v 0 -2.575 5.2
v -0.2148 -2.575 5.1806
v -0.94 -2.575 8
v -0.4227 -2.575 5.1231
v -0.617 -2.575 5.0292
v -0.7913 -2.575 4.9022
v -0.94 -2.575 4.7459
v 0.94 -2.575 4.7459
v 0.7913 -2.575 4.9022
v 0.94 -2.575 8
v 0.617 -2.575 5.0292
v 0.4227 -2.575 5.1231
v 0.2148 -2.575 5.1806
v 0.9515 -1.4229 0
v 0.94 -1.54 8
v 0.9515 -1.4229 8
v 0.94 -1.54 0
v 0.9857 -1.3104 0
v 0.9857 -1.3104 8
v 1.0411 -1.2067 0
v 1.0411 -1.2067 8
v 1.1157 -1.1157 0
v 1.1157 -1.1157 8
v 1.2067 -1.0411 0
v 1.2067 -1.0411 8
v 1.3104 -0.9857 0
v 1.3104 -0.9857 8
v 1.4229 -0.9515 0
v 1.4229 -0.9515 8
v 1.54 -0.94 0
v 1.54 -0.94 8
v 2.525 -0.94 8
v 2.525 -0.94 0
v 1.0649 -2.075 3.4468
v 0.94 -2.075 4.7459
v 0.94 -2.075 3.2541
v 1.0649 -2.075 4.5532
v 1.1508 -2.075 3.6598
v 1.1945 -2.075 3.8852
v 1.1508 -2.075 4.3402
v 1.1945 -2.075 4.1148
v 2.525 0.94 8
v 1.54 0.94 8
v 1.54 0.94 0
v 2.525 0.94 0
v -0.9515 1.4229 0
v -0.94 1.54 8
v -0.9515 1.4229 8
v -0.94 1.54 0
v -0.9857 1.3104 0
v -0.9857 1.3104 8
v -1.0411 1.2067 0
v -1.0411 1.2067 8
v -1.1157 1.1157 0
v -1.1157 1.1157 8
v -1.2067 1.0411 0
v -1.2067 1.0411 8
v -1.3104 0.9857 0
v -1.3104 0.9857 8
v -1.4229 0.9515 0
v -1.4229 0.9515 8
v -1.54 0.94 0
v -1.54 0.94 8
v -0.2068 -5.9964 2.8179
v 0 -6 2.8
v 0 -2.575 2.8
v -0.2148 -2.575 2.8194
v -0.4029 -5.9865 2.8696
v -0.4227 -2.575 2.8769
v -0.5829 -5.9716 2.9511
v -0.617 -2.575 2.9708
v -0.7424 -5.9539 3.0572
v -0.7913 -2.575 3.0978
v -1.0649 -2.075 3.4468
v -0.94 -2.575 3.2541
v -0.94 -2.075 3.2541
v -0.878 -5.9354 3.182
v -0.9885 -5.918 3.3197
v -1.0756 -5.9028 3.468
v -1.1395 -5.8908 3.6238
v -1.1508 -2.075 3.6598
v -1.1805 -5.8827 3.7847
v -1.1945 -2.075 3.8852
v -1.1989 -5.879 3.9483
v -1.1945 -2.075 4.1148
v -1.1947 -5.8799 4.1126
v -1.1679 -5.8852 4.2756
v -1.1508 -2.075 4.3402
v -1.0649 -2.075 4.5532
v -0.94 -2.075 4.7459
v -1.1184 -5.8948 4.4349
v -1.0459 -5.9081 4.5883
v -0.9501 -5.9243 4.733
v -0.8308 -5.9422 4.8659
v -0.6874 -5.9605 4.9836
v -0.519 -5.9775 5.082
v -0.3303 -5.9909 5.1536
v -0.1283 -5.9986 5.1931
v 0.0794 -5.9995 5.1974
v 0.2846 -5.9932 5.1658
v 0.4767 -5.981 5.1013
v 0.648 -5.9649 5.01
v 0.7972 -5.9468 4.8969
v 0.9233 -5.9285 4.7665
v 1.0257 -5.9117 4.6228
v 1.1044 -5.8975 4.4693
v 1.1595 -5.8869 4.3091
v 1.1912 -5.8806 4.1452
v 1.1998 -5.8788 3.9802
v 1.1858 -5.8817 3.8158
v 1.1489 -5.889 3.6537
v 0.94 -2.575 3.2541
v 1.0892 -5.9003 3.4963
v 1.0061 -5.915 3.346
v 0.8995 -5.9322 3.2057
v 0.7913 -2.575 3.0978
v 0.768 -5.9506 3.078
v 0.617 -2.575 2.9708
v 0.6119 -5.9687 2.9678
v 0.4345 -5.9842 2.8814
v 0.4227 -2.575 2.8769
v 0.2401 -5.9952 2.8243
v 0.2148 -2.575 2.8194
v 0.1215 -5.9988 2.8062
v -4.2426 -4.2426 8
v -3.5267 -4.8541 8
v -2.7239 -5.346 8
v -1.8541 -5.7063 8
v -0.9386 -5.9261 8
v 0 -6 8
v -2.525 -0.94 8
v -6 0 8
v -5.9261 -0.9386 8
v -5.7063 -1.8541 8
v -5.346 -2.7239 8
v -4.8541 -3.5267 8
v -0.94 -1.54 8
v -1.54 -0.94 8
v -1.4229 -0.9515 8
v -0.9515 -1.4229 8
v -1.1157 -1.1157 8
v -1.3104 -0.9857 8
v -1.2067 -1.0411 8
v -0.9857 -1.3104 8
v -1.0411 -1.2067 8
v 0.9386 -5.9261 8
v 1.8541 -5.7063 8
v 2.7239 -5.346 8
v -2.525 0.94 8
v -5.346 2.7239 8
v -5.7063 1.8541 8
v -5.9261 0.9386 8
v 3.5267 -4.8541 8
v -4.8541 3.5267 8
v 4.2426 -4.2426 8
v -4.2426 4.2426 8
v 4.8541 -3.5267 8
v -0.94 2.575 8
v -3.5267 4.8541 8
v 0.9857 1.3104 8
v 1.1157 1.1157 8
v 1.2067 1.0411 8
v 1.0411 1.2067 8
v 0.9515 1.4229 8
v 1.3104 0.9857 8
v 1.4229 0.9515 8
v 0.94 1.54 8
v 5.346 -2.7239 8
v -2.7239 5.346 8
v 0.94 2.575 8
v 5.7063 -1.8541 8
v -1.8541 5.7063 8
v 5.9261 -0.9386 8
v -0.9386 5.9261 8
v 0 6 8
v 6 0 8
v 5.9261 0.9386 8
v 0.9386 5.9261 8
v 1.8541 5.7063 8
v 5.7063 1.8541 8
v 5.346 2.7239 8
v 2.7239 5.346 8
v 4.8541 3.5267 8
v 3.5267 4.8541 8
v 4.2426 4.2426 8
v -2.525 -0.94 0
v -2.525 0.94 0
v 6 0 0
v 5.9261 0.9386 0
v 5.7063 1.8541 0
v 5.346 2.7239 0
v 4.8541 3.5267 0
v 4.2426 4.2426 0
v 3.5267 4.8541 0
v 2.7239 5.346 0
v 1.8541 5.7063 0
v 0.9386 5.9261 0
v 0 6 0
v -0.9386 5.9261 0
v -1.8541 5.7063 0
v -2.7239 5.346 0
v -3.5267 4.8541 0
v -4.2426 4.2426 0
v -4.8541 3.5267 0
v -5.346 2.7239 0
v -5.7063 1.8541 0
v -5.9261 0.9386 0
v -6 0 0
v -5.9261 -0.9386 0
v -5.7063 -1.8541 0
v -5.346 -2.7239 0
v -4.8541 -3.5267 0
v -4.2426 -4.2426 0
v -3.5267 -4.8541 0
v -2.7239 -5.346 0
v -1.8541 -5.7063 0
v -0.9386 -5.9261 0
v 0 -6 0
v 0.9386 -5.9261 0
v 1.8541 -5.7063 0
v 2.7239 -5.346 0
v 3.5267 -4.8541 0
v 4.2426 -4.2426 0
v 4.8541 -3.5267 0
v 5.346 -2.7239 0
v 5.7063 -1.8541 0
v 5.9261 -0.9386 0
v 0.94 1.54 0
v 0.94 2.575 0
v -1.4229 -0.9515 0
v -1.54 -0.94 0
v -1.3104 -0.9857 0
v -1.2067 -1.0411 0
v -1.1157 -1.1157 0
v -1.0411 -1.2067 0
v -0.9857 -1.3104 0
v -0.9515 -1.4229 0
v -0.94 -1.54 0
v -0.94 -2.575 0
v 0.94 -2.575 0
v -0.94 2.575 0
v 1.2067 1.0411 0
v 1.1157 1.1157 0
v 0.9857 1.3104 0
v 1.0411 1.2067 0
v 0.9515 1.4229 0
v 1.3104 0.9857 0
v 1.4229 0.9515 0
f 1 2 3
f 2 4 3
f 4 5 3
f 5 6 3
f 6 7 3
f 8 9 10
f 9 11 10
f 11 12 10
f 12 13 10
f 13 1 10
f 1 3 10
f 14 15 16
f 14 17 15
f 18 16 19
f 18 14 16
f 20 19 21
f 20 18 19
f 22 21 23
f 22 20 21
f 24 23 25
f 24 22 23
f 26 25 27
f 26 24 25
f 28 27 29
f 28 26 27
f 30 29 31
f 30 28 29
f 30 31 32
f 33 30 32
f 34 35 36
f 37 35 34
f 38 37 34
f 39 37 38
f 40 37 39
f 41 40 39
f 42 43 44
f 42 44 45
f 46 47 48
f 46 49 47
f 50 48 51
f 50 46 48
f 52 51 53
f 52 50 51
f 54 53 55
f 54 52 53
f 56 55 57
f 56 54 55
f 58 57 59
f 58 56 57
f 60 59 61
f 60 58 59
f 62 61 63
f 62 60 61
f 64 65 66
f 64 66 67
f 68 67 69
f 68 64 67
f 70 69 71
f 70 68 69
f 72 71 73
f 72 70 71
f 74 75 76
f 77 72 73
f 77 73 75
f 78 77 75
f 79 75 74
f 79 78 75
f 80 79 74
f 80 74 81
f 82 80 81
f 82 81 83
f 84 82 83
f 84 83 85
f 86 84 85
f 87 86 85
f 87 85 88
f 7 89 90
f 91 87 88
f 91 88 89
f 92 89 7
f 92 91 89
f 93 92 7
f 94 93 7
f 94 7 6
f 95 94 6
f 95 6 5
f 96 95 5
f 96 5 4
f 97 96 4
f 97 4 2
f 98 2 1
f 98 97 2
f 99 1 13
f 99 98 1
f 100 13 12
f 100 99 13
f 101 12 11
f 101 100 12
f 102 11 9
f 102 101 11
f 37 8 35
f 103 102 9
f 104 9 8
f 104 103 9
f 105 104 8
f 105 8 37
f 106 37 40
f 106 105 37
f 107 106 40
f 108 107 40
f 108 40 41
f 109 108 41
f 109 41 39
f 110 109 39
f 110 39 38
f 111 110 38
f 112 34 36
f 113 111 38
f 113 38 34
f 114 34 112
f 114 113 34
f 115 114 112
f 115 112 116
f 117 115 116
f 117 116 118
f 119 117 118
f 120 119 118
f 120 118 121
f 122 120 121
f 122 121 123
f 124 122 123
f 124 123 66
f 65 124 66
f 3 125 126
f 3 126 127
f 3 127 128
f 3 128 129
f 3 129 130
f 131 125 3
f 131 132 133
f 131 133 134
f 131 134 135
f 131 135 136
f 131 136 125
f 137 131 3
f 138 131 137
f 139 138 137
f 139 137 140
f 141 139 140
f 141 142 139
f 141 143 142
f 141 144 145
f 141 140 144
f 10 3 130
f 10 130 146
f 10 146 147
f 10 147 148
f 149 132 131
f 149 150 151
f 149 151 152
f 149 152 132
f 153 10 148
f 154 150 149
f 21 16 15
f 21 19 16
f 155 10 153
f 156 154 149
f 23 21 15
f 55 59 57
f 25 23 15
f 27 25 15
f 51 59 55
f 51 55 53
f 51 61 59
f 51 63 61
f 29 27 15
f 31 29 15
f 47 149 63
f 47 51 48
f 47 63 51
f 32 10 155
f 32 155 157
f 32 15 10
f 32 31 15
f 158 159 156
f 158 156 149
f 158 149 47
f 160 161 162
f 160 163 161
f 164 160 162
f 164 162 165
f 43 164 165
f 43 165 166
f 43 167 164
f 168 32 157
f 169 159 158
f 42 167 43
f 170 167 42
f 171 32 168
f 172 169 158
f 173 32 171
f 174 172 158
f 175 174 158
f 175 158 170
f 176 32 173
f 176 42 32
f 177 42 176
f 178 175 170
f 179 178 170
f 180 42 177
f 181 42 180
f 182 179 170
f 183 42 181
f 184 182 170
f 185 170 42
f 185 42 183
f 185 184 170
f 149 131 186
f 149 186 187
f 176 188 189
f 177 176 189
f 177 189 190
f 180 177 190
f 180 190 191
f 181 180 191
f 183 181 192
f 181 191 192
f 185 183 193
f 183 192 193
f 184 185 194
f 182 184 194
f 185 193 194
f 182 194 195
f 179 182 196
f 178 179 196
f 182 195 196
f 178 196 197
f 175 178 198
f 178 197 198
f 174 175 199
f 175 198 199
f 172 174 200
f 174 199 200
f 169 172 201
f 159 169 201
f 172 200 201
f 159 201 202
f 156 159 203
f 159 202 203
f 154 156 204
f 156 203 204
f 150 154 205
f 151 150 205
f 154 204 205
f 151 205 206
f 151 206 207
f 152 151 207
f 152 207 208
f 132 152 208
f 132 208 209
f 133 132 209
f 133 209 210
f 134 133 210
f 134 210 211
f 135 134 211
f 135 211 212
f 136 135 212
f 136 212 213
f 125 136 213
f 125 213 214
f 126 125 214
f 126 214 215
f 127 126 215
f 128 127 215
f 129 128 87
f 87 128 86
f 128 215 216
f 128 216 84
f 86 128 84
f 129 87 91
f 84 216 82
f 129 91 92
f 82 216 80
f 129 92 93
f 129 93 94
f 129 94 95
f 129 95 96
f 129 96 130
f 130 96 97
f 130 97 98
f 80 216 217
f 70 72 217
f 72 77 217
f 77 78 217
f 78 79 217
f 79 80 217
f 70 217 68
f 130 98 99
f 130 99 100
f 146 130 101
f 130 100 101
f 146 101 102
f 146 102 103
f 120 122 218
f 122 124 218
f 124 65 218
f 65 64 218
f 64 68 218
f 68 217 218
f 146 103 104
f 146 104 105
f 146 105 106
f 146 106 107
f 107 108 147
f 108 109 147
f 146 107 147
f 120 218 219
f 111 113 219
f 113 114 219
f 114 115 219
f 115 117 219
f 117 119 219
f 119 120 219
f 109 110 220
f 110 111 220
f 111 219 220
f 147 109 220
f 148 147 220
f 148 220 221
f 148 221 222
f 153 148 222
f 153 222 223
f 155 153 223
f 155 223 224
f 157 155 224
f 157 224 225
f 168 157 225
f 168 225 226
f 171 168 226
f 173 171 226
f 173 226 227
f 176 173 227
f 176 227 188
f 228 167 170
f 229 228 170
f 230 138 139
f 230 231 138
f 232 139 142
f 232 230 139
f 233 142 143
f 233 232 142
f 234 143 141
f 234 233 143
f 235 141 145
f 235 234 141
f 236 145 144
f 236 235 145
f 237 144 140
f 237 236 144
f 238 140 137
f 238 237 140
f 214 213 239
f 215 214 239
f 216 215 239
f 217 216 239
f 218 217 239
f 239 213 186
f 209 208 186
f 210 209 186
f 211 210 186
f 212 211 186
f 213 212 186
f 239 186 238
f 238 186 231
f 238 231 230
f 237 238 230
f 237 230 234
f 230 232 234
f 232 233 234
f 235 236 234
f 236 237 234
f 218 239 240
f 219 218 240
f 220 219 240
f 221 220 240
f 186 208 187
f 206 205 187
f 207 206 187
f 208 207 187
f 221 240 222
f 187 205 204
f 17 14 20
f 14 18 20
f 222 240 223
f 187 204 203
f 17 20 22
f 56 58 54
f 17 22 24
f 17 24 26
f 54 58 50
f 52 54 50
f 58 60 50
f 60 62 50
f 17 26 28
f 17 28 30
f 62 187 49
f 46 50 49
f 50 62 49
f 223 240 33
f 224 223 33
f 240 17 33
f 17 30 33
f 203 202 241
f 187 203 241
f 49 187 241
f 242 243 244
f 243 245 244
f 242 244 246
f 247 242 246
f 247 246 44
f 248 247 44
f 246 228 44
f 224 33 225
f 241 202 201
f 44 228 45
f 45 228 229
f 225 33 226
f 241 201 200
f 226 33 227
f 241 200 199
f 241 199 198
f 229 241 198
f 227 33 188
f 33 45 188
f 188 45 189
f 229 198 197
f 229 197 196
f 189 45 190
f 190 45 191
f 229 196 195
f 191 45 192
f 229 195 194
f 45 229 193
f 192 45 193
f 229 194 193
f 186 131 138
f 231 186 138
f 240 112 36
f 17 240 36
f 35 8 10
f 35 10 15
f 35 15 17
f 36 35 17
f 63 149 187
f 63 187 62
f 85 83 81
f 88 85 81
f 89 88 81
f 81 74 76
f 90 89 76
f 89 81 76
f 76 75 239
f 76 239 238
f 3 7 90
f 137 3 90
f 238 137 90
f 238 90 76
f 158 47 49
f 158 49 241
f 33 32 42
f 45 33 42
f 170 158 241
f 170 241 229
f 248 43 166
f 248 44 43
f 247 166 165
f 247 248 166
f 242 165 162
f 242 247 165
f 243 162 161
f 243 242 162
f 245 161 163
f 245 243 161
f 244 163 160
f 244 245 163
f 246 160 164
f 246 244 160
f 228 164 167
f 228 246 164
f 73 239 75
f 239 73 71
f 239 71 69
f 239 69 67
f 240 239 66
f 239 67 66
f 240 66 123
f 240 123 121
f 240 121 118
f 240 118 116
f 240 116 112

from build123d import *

# Parameters (mm, degrees)
SKETCH_1_R               = 6
EXTRUDE_1_DEPTH          = 8
SKETCH_2_W               = 5.05
SKETCH_2_H               = 1.88
SKETCH_2_W_2             = 1.88
SKETCH_2_H_2             = 5.15
CUT_EXTRUDE_1_DEPTH      = 12.66190379
FILLET_1_R               = 0.6
CUT_EXTRUDE_2_DEPTH      = 0.5
CUT_EXTRUDE_2_DEPTH_BACK = 14.17310233
SKETCH_3_R               = 1.2


with BuildPart() as part:
    # ｽｹｯﾁ1 → ﾎﾞｽ - 押し出し1 (new body)
    with BuildSketch(Plane.XY):
        Circle(SKETCH_1_R)
    extrude(amount=EXTRUDE_1_DEPTH)

    # ｽｹｯﾁ2 → ｶｯﾄ - 押し出し1 (cut, through all)
    with BuildSketch(Plane.XY.offset(8)):
        Rectangle(SKETCH_2_W, SKETCH_2_H)
        Rectangle(SKETCH_2_W_2, SKETCH_2_H_2)
    extrude(amount=-CUT_EXTRUDE_1_DEPTH, mode=Mode.SUBTRACT)

    # ﾌｨﾚｯﾄ1
    fillet_1_edges = [part.edges().sort_by_distance(p)[0] for p in [
        (-0.94, 0.94, 4),
        (0.94, -0.94, 4),
        (-0.94, -0.94, 4),
        (0.94, 0.94, 4),
    ]]
    fillet(fillet_1_edges, radius=FILLET_1_R)

    # ｽｹｯﾁ3 → ｶｯﾄ - 押し出し2 (cut, two sides: drawn at the far end of the back side and taken through both)
    with BuildSketch(Plane(origin=(0, -2.575, 0), x_dir=(1, 0, 0), z_dir=(0, 1, 0)).offset(-CUT_EXTRUDE_2_DEPTH_BACK)):
        with Locations(Location((0, -4, 0), (0, 0, 90))):
            Circle(SKETCH_3_R)
    extrude(amount=CUT_EXTRUDE_2_DEPTH + CUT_EXTRUDE_2_DEPTH_BACK, mode=Mode.SUBTRACT)


solid = part.part
